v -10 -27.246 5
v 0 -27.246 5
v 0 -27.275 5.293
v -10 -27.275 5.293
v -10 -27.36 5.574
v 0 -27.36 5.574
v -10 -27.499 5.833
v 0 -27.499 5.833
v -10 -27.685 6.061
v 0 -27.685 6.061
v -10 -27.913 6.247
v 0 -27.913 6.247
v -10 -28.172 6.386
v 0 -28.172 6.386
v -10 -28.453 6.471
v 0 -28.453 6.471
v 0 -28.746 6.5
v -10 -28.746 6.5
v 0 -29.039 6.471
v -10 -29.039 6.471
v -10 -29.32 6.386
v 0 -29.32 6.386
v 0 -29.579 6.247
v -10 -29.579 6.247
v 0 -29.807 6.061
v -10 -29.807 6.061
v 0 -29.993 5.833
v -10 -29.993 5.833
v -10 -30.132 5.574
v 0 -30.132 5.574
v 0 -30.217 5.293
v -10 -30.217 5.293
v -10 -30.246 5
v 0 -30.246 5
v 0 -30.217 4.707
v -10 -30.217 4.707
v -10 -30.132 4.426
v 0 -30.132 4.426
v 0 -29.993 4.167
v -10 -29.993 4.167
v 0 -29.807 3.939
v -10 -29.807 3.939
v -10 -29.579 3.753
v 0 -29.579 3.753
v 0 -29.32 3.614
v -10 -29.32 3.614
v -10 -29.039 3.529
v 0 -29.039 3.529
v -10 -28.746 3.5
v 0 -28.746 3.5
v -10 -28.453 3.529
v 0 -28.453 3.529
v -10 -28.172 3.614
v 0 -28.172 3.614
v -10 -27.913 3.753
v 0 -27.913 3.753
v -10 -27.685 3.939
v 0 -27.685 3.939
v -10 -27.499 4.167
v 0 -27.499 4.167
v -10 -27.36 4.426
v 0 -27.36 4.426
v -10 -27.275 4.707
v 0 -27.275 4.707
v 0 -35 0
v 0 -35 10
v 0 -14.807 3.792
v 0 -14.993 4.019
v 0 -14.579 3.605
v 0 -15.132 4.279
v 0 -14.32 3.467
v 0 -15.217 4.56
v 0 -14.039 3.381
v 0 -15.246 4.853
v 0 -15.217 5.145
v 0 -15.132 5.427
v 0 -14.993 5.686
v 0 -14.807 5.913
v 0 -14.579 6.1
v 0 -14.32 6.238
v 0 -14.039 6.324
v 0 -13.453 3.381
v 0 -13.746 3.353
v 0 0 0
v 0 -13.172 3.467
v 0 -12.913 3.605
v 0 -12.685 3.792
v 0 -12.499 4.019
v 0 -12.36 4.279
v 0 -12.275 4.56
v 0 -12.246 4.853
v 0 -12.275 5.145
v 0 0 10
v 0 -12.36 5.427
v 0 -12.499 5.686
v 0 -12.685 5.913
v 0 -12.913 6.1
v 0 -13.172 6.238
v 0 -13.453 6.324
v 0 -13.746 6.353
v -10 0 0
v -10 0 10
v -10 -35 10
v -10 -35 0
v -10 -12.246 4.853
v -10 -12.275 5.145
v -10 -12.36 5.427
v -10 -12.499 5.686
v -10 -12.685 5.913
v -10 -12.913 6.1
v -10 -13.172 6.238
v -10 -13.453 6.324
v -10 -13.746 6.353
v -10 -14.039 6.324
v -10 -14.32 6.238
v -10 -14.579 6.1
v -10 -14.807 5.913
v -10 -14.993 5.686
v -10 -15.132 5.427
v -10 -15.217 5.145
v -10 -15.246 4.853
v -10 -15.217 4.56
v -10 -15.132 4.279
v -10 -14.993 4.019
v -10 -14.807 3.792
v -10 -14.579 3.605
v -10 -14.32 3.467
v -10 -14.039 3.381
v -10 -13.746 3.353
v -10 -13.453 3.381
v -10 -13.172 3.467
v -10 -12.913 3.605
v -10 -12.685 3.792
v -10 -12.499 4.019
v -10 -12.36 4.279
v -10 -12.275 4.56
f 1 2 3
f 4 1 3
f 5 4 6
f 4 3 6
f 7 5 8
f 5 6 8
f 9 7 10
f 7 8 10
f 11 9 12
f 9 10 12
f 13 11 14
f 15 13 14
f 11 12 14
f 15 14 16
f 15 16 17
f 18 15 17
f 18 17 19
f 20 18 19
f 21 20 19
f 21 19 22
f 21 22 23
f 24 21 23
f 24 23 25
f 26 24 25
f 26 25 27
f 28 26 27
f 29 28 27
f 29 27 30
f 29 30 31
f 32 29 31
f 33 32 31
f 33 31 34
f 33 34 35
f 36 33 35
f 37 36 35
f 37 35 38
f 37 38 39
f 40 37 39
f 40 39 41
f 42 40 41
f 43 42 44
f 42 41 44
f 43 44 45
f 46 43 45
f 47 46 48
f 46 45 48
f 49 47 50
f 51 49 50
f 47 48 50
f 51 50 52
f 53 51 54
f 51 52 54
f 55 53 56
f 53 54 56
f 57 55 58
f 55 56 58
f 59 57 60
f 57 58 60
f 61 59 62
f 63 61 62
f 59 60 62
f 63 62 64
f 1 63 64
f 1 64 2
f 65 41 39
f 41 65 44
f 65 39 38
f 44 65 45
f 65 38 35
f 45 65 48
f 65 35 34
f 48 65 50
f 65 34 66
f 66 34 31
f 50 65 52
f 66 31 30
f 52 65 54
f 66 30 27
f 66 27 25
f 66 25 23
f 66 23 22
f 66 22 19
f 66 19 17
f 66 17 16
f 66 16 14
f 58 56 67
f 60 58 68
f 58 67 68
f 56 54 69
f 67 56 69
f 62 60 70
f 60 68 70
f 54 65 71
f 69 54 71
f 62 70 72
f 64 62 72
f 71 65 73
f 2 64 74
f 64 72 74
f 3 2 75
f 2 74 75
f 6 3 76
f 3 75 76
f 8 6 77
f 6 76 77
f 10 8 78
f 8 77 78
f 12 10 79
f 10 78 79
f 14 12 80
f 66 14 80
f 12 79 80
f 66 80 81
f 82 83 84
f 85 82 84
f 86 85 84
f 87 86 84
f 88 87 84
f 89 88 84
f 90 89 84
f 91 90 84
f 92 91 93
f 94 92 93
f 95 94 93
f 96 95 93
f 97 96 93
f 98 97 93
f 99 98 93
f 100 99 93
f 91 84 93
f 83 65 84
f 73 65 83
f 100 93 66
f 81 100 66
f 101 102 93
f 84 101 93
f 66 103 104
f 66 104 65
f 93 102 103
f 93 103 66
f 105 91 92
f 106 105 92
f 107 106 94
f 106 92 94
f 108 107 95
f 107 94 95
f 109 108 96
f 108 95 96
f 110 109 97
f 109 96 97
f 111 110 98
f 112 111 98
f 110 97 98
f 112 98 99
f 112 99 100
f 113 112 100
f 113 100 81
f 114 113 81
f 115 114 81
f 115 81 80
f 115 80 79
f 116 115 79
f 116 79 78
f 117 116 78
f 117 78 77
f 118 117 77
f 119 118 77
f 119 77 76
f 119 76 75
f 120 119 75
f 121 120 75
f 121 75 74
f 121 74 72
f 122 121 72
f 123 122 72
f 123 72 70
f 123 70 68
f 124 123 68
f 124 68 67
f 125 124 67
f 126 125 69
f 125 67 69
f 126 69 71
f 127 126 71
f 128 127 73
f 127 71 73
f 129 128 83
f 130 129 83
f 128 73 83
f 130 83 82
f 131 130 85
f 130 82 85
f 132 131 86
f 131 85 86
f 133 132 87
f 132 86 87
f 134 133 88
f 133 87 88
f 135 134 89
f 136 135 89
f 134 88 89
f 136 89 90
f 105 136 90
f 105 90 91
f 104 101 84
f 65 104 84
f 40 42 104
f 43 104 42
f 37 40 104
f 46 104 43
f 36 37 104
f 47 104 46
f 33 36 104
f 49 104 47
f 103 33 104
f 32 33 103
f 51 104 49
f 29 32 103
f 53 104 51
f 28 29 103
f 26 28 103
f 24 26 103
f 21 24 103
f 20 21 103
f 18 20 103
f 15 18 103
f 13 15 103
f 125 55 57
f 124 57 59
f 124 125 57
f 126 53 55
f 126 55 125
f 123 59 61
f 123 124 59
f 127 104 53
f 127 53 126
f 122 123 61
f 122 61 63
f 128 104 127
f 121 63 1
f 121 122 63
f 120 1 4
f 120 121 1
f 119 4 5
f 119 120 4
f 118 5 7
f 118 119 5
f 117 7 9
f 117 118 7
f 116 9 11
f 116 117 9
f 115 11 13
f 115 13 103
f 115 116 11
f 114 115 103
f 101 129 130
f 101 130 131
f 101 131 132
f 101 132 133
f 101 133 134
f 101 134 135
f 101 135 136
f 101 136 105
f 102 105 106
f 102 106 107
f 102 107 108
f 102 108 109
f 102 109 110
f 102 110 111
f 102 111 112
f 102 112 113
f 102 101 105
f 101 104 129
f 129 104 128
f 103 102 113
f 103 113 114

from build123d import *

# Parameters (mm, degrees)
F0_W     = 10
F0_H     = 10
F1_DEPTH = 35
F2_R     = 1.5
F3_DEPTH = 12


with BuildPart() as f1:
    # F0 (on Front) → F1 (new body)
    with BuildSketch(Plane.XZ):
        with Locations((-5, 5)):
            Rectangle(F0_W, F0_H)
    extrude(amount=F1_DEPTH)

    # F2 (on face) → F3 (cut)
    with BuildSketch(Plane.YZ):
        with Locations((-28.746059, 5)):
            Circle(F2_R)
        with Locations((-13.746059, 4.852584)):
            Circle(F2_R)
    extrude(amount=-F3_DEPTH, mode=Mode.SUBTRACT)


solid = f1.part
